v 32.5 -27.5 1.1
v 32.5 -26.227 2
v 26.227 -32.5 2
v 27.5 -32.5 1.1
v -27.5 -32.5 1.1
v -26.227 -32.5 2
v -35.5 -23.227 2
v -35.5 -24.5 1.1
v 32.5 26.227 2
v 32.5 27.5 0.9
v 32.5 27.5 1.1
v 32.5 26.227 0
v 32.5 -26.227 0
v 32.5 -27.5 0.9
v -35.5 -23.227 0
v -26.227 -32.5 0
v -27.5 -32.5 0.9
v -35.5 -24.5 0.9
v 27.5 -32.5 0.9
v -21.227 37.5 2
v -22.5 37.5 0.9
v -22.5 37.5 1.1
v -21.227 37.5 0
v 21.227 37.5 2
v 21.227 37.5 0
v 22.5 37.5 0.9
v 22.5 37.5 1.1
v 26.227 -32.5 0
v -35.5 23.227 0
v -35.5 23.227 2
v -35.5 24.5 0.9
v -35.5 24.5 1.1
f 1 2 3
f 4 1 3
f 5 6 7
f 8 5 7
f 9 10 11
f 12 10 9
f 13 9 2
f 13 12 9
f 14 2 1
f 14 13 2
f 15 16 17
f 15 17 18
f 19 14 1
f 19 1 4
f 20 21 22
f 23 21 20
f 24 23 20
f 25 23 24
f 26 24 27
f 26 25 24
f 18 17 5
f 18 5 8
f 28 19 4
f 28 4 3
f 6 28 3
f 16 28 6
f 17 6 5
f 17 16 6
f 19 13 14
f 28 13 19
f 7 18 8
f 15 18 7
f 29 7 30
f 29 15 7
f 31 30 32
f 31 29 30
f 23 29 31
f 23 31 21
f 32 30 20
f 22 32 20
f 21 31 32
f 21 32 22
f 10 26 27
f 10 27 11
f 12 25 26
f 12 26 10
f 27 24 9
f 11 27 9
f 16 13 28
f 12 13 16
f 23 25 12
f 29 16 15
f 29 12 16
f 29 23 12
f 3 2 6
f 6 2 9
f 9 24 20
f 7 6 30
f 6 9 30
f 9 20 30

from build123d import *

# Parameters (mm, degrees)
PAD_DEPTH    = 2
CHAMFER_SIZE = 0.9


with BuildPart() as part:
    # Sketch → Pad (new body)
    with BuildSketch(Plane.XY):
        Polygon((-22.5, 37.5), (22.5, 37.5), (32.5, 27.5), (32.5, -27.5), (27.5, -32.5), (-27.5, -32.5), (-35.5, -24.5), (-35.5, 24.5), align=None)
    extrude(amount=PAD_DEPTH)

    # Chamfer
    chamfer_edges = [part.edges().sort_by_distance(p)[0] for p in [
        (-29, 31, 2),
        (27.5, 32.5, 2),
        (30, -30, 2),
        (30, -30, 0),
        (-31.5, -28.5, 2),
        (-31.5, -28.5, 0),
        (27.5, 32.5, 0),
        (-29, 31, 0),
    ]]
    chamfer(chamfer_edges, length=CHAMFER_SIZE)


solid = part.part
